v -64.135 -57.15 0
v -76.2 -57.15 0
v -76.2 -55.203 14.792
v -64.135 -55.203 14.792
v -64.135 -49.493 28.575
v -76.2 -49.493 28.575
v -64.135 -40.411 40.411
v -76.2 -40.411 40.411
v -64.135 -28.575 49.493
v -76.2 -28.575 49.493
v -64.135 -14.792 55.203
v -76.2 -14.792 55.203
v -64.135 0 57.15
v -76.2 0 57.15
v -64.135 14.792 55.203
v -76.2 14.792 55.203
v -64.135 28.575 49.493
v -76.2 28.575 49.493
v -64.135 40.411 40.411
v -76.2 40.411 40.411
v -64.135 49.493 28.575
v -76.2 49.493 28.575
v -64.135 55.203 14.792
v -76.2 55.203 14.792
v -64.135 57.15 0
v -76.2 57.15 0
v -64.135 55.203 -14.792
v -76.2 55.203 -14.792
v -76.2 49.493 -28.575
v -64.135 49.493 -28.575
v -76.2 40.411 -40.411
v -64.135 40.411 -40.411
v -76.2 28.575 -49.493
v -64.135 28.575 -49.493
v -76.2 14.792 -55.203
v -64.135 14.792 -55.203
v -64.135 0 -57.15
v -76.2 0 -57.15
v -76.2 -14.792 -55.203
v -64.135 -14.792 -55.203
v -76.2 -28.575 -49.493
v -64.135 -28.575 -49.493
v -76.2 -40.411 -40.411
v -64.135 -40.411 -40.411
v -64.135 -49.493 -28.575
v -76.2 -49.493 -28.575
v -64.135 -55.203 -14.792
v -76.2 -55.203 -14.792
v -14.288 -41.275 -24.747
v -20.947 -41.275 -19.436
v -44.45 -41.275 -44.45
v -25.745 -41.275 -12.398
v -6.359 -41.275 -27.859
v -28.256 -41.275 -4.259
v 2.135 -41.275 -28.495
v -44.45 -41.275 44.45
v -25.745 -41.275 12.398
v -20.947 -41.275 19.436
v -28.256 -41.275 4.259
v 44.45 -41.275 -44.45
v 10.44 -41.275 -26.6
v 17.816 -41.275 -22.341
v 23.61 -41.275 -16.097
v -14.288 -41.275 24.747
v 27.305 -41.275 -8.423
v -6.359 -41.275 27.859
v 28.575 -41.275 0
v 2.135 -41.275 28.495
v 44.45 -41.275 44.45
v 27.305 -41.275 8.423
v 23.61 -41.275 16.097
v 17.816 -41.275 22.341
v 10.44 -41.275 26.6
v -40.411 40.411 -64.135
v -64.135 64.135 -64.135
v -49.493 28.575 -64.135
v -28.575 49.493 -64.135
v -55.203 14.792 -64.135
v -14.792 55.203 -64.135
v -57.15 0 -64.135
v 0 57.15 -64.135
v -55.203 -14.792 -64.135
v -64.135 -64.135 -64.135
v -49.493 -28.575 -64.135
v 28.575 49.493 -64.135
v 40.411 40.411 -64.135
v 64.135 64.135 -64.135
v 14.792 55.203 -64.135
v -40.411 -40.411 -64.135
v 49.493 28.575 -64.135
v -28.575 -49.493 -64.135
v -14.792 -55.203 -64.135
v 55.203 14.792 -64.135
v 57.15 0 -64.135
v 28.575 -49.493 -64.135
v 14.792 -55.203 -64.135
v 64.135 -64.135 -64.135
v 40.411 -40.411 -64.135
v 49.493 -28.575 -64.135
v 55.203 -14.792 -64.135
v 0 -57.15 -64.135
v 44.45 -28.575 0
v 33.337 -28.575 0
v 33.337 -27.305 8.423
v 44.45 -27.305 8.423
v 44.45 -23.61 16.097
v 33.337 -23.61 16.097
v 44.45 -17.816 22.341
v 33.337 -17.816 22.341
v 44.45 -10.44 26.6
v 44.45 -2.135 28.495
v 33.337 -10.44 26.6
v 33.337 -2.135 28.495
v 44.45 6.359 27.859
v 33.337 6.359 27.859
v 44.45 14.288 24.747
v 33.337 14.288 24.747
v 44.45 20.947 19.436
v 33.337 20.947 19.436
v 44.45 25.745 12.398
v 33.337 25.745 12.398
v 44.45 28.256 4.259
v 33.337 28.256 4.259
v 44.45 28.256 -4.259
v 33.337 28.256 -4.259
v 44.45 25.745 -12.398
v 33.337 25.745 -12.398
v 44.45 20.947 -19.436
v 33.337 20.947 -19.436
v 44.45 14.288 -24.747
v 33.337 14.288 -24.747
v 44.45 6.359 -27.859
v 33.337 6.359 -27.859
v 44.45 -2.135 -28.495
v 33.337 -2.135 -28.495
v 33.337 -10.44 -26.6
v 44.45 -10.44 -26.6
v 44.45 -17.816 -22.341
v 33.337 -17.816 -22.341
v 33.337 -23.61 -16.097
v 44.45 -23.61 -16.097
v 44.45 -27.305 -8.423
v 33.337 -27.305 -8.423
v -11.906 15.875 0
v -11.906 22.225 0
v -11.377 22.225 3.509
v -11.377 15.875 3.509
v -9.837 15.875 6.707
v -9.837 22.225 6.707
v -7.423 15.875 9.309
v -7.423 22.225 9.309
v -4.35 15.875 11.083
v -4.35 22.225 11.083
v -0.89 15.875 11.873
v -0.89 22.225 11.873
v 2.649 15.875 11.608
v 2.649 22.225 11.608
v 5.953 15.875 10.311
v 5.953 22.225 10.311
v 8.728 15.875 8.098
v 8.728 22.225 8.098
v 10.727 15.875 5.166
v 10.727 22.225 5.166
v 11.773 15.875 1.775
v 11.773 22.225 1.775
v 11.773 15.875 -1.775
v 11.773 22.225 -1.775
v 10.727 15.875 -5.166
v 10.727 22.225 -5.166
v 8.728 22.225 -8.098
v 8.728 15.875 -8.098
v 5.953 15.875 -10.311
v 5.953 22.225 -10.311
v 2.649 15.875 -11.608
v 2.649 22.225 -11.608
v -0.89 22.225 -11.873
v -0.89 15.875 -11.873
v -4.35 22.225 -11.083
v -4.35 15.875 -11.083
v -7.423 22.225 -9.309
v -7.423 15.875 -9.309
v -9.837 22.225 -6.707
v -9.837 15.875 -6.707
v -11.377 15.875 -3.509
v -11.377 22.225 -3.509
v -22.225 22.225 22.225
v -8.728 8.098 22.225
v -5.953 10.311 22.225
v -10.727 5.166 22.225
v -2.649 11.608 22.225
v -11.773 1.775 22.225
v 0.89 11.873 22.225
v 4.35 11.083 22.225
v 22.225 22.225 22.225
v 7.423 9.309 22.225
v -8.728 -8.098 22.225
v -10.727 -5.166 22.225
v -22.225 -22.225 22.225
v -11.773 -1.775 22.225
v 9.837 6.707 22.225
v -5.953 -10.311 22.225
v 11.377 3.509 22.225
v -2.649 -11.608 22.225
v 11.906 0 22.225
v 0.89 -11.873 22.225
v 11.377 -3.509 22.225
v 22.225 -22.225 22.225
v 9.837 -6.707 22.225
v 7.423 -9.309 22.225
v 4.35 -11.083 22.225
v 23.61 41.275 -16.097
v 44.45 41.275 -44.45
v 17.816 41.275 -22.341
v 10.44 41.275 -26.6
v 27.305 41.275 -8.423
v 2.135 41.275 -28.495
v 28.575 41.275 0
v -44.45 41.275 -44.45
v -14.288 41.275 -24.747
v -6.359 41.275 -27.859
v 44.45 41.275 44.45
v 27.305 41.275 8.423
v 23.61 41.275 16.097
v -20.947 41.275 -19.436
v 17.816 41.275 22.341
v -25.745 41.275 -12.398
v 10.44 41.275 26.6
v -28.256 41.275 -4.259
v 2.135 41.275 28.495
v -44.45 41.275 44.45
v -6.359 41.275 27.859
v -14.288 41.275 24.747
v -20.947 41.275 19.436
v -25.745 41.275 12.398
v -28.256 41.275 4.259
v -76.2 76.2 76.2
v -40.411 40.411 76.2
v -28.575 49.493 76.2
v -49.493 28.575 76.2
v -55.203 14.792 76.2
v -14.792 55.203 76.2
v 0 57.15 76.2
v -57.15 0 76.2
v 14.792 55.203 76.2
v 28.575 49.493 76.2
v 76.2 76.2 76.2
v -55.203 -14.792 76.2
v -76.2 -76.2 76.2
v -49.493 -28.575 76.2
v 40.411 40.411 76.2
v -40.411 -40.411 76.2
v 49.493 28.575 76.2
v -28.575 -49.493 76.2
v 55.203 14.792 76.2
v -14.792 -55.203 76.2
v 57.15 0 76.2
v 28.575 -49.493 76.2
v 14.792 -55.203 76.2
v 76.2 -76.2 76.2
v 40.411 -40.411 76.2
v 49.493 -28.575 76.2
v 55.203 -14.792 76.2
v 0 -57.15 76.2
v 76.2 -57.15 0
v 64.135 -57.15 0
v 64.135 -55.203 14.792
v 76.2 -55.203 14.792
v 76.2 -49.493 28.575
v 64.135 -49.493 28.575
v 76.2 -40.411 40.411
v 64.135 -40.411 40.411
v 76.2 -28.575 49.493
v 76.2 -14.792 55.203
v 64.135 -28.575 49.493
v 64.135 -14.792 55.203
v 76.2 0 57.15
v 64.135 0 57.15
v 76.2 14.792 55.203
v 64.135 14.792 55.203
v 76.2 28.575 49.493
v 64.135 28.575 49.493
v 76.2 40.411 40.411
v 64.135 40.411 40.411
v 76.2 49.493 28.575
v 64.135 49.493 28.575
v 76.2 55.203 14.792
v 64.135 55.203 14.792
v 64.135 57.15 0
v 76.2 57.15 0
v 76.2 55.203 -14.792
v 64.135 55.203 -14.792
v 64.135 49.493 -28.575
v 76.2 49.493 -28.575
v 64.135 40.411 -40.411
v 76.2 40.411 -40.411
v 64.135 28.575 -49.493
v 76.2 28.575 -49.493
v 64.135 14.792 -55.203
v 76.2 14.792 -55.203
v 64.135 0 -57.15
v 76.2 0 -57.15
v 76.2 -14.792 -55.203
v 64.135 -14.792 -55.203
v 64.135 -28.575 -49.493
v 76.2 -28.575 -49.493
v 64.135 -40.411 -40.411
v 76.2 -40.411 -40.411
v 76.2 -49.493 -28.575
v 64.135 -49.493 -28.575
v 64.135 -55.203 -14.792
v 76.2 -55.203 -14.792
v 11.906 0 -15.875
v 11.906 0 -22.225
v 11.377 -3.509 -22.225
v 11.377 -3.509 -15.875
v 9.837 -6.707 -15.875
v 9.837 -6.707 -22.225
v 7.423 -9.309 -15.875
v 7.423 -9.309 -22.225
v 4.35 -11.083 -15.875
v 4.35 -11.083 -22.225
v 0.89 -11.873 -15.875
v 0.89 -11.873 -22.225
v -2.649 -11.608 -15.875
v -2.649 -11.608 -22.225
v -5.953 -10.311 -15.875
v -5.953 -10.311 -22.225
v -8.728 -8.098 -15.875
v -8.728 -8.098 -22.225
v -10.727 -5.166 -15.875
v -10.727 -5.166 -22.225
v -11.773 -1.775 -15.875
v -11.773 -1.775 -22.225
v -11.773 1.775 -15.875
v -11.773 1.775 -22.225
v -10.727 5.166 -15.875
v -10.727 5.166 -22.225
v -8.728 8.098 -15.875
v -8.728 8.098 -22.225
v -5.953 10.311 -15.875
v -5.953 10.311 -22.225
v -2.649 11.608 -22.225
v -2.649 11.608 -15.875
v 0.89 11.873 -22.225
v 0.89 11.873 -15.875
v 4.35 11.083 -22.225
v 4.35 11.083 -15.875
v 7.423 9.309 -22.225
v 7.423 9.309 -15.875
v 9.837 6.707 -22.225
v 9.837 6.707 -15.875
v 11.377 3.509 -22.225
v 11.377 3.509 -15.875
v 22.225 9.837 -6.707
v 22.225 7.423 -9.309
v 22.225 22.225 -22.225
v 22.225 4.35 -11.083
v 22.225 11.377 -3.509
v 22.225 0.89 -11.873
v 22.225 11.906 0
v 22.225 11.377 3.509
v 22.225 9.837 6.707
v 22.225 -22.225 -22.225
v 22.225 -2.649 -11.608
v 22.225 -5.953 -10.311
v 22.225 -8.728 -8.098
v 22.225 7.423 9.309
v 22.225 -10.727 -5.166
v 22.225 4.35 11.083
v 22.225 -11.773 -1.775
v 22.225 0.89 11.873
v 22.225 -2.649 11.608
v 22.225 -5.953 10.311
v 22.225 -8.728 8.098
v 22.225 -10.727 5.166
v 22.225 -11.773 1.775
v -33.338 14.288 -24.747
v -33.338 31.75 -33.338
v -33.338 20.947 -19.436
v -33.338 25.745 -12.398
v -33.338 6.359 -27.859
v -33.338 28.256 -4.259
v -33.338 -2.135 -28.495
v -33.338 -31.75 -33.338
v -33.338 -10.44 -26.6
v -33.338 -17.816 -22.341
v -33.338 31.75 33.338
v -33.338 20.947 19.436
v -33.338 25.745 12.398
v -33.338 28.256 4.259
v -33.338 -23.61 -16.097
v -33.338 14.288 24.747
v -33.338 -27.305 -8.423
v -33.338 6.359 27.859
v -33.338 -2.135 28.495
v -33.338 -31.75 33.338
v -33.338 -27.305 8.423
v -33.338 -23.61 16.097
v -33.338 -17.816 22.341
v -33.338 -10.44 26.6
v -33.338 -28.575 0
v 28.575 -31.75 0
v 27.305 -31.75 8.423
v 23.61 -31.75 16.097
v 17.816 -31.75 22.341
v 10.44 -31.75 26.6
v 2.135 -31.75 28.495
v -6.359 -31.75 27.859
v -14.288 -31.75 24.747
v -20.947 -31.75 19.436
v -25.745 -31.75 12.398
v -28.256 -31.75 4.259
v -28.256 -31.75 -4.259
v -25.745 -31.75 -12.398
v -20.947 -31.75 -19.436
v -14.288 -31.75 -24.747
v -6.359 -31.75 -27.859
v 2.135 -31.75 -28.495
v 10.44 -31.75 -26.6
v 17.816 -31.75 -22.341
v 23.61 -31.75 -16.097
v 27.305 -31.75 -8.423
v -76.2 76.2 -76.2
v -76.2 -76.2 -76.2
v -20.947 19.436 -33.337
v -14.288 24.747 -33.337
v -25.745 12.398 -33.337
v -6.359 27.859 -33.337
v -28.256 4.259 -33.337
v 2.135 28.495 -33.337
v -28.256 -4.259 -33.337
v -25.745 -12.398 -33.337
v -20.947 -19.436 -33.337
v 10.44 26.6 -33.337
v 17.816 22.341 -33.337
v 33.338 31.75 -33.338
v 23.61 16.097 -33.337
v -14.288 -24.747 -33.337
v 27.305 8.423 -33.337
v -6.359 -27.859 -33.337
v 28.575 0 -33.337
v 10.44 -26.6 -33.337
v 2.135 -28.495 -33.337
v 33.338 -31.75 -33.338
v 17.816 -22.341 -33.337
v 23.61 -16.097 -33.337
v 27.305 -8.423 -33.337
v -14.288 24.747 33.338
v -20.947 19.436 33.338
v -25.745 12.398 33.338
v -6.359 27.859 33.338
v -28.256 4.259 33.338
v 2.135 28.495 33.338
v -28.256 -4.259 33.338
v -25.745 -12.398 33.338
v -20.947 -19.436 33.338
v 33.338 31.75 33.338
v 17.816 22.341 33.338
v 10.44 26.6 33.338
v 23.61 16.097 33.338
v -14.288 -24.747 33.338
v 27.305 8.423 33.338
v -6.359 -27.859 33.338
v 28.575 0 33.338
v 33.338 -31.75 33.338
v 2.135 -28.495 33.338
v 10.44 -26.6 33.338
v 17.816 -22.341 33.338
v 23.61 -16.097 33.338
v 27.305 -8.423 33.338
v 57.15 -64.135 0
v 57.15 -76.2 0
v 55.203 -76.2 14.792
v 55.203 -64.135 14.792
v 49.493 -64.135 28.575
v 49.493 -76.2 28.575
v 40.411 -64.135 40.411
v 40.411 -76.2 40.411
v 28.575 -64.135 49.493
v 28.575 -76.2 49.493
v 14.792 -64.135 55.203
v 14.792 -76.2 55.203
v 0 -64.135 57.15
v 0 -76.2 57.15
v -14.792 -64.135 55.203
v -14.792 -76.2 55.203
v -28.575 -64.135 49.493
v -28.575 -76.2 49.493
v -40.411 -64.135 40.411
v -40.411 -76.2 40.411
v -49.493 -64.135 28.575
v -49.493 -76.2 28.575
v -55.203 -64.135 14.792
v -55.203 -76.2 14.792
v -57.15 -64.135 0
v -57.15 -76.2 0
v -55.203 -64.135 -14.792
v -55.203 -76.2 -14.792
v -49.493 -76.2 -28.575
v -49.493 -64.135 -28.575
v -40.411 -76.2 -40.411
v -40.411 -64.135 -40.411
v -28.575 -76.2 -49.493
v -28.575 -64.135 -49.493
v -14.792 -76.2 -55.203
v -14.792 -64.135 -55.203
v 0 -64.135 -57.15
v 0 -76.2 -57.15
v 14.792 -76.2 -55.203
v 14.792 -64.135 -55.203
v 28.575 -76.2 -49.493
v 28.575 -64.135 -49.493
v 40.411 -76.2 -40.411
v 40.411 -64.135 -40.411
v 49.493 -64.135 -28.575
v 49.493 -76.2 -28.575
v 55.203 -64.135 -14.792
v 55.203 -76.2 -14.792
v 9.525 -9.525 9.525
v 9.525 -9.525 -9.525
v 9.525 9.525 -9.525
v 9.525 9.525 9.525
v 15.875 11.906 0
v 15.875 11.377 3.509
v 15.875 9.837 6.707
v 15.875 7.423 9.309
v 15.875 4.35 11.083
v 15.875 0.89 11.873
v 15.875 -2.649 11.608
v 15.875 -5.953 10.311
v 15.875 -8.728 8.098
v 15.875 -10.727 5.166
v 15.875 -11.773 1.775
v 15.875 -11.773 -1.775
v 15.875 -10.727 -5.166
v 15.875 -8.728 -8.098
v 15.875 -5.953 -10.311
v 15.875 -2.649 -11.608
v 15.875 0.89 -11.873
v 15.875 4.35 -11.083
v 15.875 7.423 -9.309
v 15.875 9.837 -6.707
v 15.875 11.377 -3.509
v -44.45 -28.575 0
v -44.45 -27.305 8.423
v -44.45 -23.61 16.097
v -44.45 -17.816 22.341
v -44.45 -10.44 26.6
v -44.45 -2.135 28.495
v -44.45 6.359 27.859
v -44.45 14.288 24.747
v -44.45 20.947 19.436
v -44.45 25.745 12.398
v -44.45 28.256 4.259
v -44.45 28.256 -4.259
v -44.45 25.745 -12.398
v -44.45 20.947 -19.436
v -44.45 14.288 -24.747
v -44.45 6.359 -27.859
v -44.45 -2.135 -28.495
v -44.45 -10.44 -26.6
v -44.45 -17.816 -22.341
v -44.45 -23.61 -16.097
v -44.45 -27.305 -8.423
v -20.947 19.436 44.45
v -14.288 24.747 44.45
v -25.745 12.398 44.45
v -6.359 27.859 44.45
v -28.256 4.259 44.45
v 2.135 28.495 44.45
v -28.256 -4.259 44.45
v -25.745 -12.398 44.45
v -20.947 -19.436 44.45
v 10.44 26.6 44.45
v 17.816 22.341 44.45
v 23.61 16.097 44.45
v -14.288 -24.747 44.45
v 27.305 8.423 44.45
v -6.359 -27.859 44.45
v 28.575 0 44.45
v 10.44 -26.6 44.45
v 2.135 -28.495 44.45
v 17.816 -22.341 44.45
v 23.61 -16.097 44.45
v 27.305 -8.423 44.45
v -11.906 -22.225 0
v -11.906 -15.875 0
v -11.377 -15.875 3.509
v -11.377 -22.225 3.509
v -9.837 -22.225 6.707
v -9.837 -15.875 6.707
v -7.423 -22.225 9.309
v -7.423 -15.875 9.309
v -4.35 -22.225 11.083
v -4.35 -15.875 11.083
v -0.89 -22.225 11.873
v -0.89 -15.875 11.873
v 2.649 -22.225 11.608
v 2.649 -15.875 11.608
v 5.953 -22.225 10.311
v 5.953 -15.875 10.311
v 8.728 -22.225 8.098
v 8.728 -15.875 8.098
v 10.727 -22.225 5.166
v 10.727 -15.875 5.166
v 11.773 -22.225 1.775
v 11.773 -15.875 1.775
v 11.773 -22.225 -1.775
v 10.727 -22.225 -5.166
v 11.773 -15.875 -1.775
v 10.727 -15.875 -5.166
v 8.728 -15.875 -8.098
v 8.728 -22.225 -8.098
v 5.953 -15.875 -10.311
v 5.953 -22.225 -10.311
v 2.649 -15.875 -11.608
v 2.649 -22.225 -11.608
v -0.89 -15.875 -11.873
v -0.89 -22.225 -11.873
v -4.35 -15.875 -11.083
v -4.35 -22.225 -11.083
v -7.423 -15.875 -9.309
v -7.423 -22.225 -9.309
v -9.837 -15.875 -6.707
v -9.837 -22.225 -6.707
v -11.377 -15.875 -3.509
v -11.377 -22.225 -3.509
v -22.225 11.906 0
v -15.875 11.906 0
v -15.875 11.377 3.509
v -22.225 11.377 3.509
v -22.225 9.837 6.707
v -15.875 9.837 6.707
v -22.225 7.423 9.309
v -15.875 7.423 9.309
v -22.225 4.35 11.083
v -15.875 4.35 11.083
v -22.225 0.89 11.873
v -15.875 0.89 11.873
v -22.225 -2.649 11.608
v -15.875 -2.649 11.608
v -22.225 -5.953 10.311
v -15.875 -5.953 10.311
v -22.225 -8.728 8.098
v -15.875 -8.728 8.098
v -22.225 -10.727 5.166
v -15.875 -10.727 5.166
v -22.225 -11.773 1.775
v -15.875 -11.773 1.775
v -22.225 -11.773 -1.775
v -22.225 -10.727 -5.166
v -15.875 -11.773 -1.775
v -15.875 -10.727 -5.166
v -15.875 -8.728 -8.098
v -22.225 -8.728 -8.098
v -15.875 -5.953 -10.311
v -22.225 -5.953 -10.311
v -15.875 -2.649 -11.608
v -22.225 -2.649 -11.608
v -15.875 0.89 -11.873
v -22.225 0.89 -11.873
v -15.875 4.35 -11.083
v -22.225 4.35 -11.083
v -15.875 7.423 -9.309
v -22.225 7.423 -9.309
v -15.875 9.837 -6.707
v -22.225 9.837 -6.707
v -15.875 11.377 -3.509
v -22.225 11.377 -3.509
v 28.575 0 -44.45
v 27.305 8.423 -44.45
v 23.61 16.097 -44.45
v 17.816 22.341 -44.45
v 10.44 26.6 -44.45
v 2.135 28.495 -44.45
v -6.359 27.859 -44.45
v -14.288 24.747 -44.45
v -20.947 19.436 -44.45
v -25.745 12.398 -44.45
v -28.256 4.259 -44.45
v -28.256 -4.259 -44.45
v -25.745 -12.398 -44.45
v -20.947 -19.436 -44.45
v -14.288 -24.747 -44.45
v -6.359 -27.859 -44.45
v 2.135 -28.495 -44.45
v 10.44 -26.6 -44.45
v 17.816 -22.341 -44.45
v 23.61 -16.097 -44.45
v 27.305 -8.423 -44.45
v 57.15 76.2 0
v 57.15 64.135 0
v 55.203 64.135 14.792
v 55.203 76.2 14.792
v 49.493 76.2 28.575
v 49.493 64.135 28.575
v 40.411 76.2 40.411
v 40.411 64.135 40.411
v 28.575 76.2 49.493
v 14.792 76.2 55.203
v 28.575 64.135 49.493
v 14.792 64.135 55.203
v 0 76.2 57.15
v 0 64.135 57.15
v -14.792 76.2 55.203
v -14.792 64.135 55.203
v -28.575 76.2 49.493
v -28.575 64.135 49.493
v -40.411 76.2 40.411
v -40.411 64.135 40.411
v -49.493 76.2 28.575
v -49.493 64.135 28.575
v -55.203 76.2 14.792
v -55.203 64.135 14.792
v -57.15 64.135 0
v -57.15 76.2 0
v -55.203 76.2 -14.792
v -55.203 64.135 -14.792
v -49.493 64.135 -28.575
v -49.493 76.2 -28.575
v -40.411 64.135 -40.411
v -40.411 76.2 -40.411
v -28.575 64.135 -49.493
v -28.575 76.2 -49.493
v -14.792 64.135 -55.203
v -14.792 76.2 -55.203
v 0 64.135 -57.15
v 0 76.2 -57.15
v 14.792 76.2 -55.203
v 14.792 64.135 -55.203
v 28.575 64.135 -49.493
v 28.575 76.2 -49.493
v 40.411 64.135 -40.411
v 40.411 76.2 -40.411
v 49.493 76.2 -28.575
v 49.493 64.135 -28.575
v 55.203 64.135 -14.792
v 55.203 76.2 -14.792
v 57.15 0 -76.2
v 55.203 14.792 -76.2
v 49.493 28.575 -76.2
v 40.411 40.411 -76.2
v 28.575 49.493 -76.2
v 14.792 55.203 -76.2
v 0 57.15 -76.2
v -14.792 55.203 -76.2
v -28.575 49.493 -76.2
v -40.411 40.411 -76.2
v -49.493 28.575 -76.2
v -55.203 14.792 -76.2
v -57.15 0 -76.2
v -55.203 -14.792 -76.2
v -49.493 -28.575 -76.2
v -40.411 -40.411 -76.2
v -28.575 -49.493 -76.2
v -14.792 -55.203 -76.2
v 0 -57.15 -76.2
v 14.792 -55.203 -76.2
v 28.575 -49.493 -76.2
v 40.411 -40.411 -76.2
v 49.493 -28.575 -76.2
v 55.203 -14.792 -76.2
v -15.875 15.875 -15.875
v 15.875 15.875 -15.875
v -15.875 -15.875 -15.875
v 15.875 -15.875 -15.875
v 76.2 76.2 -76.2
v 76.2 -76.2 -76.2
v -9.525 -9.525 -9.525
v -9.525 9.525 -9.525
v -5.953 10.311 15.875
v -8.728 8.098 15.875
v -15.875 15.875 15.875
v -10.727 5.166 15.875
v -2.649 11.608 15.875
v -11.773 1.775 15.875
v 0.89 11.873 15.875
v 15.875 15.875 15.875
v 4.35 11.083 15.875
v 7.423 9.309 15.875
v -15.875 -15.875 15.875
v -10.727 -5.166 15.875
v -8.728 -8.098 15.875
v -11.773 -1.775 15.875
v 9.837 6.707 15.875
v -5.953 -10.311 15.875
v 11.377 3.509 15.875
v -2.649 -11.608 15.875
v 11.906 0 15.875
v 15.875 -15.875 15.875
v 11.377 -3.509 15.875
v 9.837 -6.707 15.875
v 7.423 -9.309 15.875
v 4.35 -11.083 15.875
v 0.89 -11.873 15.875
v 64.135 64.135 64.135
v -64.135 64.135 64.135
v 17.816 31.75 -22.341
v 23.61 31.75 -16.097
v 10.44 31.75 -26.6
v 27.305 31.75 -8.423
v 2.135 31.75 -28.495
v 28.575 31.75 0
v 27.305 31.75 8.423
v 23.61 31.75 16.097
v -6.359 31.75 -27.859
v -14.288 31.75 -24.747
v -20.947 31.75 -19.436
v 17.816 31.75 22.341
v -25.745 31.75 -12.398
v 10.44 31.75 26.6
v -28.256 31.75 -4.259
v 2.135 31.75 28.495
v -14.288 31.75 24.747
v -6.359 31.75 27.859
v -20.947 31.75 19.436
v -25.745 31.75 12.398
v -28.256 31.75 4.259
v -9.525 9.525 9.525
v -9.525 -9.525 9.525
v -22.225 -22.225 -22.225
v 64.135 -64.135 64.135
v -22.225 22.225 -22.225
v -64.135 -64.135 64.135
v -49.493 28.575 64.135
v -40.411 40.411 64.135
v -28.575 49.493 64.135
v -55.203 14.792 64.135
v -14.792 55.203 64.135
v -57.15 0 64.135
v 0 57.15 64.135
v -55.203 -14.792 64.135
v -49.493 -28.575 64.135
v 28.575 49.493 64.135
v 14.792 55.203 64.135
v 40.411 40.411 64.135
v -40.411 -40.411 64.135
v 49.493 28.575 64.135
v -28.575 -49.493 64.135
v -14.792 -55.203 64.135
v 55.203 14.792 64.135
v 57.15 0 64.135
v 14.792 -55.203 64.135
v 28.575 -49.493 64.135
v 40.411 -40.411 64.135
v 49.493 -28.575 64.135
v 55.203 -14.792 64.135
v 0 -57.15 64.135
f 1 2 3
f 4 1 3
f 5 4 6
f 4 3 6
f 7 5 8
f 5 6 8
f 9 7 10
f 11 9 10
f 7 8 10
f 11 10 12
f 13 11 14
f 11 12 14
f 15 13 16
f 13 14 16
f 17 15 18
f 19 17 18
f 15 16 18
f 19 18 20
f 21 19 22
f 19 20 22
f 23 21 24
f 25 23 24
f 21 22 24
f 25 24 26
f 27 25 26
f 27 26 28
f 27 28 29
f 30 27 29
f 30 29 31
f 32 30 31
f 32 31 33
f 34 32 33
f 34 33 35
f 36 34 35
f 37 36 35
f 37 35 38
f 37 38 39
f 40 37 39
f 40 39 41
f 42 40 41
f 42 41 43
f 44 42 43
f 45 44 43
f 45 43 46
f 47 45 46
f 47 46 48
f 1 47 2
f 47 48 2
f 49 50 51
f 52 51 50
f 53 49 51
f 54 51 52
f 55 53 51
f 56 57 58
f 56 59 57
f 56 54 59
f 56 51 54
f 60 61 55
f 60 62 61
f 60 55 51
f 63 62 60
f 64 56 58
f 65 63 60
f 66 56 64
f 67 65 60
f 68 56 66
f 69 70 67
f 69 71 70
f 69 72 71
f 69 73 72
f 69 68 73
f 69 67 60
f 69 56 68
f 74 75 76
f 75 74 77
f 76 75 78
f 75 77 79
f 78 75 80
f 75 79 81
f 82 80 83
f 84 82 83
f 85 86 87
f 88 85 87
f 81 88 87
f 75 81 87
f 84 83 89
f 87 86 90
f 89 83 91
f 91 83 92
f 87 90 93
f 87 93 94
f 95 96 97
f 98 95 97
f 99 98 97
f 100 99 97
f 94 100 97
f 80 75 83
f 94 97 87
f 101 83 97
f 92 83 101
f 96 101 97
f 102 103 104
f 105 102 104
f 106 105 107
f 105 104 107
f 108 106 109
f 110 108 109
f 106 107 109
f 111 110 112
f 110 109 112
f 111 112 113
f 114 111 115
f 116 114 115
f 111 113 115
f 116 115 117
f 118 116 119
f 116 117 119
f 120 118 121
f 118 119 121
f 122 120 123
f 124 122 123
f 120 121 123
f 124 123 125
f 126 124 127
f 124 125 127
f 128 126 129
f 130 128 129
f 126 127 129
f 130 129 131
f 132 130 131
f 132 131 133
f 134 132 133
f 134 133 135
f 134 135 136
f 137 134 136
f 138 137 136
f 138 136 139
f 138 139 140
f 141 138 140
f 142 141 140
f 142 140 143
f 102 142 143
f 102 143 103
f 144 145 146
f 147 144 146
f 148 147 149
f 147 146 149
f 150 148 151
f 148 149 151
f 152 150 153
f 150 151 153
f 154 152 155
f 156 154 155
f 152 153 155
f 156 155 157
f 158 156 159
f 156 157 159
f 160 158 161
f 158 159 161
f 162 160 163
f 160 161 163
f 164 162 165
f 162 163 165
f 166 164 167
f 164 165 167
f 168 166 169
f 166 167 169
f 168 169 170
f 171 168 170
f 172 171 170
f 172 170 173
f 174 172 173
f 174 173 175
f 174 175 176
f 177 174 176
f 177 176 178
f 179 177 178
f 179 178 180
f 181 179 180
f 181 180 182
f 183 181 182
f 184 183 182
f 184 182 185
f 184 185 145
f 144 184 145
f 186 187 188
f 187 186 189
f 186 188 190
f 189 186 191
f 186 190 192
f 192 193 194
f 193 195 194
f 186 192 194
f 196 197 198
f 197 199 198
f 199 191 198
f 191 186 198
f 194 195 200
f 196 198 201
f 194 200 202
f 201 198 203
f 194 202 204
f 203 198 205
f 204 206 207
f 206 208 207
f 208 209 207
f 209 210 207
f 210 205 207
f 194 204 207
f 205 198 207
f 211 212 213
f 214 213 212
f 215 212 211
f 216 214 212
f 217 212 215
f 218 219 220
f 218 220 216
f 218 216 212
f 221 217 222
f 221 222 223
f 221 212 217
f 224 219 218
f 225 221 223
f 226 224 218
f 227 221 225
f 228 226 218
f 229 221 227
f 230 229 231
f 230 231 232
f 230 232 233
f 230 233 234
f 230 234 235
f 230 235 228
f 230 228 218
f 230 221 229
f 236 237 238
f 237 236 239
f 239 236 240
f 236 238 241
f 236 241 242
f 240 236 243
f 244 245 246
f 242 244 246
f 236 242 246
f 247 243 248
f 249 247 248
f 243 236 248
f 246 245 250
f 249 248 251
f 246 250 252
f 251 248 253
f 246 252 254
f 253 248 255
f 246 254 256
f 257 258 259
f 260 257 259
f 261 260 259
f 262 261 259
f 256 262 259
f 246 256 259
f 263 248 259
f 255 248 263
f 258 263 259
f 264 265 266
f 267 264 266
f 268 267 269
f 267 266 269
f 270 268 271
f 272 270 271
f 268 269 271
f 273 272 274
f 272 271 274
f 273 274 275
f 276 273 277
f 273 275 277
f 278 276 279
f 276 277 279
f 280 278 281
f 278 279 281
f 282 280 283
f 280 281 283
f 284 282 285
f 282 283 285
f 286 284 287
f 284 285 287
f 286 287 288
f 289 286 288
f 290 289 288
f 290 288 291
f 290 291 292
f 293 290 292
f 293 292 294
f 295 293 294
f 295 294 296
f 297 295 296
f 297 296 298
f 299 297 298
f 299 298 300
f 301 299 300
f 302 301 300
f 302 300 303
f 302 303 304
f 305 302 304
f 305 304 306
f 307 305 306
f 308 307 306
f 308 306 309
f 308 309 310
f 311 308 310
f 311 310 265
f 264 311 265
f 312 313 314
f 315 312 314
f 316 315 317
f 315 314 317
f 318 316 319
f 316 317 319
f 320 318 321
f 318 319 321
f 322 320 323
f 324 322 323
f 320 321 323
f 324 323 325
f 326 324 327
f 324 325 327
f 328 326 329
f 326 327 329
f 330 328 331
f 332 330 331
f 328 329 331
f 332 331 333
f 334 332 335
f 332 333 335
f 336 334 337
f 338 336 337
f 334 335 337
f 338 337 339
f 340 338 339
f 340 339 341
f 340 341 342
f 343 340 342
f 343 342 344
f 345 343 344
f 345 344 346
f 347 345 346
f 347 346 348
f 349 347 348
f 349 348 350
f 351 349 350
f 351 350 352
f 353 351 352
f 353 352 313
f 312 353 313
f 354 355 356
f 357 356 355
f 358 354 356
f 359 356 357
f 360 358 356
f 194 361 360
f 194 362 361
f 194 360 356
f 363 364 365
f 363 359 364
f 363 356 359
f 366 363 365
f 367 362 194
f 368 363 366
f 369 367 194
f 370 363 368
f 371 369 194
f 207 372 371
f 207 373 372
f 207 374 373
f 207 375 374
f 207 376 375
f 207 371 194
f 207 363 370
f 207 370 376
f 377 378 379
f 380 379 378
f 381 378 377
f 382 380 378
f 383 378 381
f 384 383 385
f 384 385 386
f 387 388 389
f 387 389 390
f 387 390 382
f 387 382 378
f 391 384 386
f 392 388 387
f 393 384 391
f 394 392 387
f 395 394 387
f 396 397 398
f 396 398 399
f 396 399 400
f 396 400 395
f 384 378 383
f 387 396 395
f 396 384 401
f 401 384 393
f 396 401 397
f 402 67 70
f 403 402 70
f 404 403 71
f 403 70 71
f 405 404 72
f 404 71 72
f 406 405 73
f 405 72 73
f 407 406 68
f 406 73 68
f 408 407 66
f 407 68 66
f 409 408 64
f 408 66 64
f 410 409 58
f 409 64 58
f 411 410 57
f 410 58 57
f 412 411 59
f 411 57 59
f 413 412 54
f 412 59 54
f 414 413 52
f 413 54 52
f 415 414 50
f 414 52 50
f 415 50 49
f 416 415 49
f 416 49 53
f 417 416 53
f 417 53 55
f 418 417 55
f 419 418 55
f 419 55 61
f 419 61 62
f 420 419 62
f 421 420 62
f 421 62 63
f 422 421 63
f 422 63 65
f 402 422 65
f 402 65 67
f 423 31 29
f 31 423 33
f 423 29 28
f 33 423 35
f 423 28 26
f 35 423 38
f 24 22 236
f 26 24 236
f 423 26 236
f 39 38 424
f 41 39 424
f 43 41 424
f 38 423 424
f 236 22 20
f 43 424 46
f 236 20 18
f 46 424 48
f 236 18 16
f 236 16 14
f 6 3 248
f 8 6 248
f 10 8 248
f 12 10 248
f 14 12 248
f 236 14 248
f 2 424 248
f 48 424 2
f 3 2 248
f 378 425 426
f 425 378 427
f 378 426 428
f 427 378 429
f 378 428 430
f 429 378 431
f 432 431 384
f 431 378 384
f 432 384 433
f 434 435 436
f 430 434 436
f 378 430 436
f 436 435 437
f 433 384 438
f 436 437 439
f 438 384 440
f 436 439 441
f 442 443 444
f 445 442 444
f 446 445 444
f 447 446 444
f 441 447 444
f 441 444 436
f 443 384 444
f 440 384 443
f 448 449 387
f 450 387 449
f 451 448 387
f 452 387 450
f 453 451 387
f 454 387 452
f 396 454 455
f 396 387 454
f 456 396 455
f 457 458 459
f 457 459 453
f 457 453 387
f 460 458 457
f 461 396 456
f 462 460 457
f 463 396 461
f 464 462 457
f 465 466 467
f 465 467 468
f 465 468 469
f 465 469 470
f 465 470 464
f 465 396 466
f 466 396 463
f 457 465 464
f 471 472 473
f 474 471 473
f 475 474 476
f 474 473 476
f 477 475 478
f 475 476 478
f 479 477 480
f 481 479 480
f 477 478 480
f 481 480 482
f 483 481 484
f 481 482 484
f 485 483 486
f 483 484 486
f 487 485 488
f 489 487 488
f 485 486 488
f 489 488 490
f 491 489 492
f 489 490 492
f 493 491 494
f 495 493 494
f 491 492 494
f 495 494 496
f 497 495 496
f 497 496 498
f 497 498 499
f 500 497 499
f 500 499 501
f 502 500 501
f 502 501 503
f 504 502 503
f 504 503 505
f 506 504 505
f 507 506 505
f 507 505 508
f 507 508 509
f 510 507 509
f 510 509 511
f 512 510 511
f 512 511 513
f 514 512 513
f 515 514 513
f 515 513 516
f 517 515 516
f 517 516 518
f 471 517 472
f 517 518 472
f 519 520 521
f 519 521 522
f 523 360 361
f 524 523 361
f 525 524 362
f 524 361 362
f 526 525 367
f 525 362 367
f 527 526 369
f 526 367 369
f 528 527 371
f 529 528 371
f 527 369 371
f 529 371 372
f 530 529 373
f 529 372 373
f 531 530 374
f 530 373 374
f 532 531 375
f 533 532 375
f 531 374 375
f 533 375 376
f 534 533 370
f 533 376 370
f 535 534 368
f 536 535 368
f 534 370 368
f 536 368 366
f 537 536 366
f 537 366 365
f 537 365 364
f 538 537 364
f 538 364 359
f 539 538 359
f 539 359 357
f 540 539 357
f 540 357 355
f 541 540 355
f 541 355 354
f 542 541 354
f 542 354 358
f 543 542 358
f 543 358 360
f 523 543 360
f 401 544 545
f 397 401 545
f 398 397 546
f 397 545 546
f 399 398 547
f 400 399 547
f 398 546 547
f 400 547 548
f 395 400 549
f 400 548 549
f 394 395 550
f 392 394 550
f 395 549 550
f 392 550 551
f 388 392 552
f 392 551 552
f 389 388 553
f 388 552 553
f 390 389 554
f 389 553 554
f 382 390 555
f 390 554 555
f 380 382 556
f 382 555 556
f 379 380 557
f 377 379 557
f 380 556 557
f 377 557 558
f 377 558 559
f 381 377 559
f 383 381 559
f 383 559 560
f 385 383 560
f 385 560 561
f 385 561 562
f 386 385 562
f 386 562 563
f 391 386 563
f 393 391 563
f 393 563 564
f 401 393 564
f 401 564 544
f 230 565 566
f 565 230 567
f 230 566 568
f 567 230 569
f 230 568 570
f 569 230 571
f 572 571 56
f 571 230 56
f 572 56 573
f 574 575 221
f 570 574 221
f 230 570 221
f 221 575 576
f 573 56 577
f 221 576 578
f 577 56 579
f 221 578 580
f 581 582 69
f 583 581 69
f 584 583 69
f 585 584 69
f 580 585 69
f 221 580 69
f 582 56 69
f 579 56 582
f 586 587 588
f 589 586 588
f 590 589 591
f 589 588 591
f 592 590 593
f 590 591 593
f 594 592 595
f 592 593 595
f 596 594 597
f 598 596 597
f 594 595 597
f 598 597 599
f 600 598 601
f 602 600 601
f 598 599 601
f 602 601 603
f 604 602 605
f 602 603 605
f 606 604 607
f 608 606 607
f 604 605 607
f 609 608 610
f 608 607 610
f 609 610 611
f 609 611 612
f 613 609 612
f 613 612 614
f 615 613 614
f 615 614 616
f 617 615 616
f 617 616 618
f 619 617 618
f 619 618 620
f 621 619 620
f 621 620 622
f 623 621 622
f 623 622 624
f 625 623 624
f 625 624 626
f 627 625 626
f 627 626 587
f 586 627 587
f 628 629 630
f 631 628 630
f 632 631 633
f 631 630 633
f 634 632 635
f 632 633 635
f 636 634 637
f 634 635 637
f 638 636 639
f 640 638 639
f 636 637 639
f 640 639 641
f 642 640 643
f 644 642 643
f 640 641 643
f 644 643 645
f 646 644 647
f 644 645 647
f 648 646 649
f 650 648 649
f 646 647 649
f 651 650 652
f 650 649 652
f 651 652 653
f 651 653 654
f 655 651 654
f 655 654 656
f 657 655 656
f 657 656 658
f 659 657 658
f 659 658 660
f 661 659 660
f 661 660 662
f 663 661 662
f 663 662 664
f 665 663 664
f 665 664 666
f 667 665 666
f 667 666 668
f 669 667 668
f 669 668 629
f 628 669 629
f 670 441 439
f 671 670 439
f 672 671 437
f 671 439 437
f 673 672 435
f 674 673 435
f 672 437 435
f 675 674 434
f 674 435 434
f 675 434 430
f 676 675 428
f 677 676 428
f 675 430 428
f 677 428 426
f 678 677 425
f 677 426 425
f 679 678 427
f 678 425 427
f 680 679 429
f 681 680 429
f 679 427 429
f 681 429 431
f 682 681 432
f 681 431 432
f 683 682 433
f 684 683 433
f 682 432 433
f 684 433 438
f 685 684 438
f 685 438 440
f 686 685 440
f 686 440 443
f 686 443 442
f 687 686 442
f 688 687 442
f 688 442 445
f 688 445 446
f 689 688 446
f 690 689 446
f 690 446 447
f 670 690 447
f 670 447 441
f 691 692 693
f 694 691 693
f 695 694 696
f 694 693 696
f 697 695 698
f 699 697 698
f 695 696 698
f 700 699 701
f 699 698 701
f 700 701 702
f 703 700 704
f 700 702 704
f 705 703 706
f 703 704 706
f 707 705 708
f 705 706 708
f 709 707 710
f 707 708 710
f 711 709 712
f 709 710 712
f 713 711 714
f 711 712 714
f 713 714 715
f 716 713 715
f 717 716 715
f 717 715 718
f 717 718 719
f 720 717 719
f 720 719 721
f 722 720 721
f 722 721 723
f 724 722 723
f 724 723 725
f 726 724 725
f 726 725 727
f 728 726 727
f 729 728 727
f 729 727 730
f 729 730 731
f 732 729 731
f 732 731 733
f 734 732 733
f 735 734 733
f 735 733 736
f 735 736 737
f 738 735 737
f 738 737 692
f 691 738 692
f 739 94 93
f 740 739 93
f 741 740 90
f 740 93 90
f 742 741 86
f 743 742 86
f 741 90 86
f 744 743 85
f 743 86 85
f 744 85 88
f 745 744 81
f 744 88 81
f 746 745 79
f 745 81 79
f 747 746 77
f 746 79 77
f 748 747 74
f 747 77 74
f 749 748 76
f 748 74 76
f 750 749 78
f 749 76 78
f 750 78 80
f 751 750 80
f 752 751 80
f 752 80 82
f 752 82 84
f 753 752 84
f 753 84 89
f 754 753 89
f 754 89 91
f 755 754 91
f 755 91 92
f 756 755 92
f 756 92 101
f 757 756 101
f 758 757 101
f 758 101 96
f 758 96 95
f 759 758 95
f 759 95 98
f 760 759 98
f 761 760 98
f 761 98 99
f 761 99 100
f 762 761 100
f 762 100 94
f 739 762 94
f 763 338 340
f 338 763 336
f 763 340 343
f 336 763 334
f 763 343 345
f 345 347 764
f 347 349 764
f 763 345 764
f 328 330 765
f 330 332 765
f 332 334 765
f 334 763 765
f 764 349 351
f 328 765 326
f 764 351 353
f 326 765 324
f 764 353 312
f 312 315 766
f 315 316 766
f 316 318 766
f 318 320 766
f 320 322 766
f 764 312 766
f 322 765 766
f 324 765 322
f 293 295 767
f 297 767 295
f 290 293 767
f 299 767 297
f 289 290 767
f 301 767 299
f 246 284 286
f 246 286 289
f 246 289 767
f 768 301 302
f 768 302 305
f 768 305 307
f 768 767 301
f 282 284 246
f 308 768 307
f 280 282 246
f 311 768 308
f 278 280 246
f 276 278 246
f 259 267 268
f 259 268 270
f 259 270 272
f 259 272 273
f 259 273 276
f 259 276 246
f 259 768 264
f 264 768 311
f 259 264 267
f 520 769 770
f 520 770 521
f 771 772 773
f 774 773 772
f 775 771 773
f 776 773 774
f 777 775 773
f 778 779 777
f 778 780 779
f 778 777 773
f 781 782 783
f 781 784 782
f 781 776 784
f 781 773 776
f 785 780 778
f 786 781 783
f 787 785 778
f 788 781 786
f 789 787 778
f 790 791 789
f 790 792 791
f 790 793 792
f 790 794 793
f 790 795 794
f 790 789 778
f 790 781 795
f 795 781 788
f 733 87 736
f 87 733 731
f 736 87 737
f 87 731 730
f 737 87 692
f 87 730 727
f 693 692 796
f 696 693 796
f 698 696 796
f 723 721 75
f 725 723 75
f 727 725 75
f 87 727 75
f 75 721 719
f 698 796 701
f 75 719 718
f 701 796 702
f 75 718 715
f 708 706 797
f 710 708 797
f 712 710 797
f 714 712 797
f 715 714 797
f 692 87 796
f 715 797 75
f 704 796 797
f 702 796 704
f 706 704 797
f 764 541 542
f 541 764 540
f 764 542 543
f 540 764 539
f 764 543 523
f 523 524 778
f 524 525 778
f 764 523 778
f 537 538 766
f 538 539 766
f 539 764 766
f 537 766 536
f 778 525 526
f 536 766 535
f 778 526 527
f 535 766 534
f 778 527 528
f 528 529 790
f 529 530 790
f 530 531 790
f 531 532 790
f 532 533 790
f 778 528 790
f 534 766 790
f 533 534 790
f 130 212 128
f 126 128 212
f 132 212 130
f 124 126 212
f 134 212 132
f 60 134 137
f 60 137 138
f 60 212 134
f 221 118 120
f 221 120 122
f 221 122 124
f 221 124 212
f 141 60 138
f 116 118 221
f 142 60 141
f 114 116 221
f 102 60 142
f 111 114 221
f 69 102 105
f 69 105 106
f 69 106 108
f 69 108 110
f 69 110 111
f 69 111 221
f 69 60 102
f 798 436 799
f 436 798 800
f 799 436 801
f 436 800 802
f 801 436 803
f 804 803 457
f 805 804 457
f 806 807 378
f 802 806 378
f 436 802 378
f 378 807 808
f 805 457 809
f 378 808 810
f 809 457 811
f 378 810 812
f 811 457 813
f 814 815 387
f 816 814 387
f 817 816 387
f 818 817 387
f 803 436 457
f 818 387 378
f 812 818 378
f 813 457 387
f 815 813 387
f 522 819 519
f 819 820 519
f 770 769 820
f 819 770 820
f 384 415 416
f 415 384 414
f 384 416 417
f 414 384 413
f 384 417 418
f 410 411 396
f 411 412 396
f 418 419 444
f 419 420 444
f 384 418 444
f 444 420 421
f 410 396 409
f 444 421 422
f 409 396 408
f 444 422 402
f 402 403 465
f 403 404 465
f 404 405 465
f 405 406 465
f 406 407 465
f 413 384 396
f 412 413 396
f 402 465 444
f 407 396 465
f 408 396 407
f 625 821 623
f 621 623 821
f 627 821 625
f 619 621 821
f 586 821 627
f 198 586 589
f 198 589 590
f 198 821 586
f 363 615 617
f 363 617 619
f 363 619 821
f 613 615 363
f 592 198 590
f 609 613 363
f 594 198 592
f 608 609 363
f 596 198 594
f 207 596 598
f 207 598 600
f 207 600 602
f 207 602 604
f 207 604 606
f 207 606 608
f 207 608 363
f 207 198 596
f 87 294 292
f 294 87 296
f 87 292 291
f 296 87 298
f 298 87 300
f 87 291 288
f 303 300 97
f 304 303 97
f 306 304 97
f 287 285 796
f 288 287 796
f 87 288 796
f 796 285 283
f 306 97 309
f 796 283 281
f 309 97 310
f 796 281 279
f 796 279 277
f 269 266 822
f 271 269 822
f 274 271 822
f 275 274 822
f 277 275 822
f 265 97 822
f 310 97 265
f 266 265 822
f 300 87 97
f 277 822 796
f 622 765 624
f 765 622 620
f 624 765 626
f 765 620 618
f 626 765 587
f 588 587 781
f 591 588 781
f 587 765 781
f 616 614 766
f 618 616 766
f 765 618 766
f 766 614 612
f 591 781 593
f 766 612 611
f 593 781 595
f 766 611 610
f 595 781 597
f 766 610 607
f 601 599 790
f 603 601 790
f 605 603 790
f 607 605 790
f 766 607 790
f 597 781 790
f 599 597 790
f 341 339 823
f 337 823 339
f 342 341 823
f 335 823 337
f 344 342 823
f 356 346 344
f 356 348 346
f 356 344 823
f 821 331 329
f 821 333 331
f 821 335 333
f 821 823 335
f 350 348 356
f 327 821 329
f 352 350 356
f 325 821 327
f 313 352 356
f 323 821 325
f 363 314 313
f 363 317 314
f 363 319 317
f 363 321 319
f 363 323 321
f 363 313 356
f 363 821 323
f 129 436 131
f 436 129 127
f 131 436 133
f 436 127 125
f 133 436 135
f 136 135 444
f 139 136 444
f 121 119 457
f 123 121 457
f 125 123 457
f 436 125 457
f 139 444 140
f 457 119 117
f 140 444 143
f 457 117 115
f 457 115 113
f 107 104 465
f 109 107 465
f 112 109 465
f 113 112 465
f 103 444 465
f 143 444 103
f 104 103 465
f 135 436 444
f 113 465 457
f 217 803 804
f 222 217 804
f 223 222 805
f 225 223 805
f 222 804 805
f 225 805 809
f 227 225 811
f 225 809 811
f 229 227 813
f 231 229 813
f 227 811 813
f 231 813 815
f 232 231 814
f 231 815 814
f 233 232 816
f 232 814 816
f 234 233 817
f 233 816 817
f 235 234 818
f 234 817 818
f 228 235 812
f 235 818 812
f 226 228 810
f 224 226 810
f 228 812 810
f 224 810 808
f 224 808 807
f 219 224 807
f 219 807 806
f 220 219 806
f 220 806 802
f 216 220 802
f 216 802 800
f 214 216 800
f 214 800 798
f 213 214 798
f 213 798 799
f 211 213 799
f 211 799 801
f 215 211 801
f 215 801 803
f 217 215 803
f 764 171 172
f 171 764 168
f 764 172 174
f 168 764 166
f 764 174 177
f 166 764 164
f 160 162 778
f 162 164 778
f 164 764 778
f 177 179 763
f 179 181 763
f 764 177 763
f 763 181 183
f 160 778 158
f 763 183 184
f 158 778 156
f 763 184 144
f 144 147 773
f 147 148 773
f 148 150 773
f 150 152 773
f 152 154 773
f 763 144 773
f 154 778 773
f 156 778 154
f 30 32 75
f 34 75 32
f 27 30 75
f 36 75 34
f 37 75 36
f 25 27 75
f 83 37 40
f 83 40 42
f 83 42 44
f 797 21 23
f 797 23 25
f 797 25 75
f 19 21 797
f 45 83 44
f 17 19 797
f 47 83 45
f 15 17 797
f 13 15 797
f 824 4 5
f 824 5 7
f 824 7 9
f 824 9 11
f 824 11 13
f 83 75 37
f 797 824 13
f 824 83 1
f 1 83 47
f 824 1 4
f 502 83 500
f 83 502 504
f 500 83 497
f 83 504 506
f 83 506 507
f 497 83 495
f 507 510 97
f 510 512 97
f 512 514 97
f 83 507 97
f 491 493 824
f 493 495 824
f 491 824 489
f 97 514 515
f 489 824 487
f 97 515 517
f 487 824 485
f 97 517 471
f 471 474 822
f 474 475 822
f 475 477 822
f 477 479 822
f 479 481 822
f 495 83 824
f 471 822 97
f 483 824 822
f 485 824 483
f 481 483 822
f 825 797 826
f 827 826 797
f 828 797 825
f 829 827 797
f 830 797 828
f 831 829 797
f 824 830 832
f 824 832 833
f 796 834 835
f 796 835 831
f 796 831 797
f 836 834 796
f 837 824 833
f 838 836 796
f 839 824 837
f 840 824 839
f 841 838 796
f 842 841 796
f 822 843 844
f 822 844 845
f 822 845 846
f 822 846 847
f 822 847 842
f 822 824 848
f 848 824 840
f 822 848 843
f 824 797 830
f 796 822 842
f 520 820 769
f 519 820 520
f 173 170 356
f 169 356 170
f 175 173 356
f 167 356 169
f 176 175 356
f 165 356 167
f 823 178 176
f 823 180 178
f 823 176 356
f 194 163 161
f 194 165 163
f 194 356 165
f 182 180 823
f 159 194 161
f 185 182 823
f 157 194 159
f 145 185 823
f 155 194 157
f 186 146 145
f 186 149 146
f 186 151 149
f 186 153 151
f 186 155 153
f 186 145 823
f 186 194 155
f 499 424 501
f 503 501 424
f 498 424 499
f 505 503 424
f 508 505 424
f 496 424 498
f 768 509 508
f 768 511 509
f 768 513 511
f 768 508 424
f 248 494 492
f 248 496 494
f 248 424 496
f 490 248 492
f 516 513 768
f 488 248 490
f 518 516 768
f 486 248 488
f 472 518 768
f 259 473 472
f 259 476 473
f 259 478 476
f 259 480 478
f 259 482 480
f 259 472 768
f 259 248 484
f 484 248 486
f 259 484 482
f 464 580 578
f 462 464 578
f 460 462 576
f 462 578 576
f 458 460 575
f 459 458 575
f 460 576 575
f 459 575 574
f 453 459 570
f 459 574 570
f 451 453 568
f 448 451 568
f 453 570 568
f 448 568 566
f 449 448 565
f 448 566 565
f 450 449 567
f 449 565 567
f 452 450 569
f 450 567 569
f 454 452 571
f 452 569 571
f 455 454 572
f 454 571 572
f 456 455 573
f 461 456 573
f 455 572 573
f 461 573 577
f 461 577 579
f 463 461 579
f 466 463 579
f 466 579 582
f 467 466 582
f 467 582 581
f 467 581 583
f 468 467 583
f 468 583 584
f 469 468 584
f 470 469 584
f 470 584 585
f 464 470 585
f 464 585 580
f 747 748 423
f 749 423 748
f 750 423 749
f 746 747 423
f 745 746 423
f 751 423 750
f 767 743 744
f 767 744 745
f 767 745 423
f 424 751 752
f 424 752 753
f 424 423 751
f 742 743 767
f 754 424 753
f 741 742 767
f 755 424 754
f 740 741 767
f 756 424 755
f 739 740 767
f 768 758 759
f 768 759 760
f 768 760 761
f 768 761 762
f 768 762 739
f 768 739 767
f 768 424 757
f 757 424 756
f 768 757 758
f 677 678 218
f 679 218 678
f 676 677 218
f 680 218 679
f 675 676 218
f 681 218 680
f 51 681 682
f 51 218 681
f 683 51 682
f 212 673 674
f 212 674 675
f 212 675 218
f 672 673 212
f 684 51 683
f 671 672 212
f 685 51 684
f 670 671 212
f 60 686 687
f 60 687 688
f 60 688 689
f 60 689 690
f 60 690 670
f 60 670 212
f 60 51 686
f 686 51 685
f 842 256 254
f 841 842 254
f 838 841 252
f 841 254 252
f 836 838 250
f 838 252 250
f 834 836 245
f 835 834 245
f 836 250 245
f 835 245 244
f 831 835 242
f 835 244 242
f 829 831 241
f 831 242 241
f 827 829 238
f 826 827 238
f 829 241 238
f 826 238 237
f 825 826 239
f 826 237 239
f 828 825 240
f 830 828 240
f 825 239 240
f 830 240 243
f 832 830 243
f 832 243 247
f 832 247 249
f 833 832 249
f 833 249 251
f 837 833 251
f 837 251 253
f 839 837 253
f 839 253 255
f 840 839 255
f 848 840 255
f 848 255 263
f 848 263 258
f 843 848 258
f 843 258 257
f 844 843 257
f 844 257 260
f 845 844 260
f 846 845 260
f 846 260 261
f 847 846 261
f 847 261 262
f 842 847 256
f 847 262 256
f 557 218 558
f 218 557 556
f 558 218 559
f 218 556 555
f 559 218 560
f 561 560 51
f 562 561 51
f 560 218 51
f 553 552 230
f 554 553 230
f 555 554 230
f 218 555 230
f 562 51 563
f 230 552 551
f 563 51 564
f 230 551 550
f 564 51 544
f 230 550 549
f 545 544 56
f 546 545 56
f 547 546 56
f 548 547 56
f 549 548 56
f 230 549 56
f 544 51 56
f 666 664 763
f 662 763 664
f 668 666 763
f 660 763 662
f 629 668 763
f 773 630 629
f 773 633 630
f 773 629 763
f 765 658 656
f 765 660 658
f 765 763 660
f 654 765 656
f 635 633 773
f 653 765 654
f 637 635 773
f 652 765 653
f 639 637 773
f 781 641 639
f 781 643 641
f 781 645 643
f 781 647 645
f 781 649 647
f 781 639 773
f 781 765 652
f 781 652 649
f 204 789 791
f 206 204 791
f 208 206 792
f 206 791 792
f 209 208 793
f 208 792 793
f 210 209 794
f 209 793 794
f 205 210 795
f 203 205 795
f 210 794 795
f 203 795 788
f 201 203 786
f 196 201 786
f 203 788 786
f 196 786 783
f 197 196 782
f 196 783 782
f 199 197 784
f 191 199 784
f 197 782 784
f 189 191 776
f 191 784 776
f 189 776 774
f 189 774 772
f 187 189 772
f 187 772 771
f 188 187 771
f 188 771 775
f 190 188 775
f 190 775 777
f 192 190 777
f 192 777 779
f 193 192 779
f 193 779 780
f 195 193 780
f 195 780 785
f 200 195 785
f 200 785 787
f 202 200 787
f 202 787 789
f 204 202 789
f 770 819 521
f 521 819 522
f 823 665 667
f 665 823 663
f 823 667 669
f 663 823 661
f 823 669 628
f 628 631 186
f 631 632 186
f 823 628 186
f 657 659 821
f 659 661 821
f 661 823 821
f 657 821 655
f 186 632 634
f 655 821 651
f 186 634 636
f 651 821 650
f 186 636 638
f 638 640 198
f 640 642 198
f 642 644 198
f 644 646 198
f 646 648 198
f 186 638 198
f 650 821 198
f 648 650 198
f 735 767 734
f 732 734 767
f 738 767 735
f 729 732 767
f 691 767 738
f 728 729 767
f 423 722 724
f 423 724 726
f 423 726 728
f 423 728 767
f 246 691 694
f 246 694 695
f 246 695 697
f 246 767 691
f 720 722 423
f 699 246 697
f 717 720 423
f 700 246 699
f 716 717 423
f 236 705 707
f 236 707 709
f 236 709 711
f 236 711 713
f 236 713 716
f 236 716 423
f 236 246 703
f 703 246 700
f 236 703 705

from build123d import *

# Parameters (mm, degrees)
F0_W      = 19.05
F0_H      = 19.05
F1_DEPTH  = 9.525
F2_W      = 44.45
F2_H      = 44.45
F2_W_2    = 31.75
F2_H_2    = 31.75
F3_DEPTH  = 22.225
F4_W      = 31.75
F4_H      = 31.75
F5_DEPTH  = 6.35
F6_W      = 31.75
F6_H      = 31.75
F7_DEPTH  = 6.35
F8_R      = 11.90625
F9_DEPTH  = 44.451
F10_R     = 11.90625
F11_DEPTH = 44.451
F12_R     = 11.90625
F13_DEPTH = 44.451
F14_W     = 88.9
F14_H     = 88.9
F14_W_2   = 66.675
F14_H_2   = 66.675
F15_DEPTH = 41.275
F16_W     = 66.675
F16_H     = 66.675
F17_DEPTH = 9.525
F18_W     = 66.675
F18_H     = 66.675
F19_DEPTH = 9.525
F20_R     = 28.575
F21_DEPTH = 82.551
F22_R     = 28.575
F23_DEPTH = 88.901
F24_R     = 28.575
F25_DEPTH = 88.901
F26_W     = 152.4
F26_H     = 152.4
F26_W_2   = 128.27
F26_H_2   = 128.27
F27_DEPTH = 76.2
F28_W     = 128.27
F28_H     = 128.27
F29_DEPTH = 12.065
F30_W     = 128.27
F30_H     = 128.27
F31_DEPTH = 12.065
F32_R     = 57.15
F33_DEPTH = 152.401
F34_R     = 57.15
F35_DEPTH = 152.401
F36_R     = 57.15
F37_DEPTH = 152.401


with BuildPart() as f1:
    # F0 (on Front) → F1 (new body, symmetric)
    with BuildSketch(Plane.XZ):
        Rectangle(F0_W, F0_H)
    extrude(amount=F1_DEPTH, both=True)


with BuildPart() as f3:
    # F2 (on Front) → F3 (new body, symmetric)
    with BuildSketch(Plane.XZ):
        Rectangle(F2_W, F2_H)
        Rectangle(F2_W_2, F2_H_2, mode=Mode.SUBTRACT)
    extrude(amount=F3_DEPTH, both=True)

    # F4 (on face) → F5 (join)
    with BuildSketch(Plane.XZ.offset(22.225)):
        Rectangle(F4_W, F4_H)
    extrude(amount=-F5_DEPTH)

    # F6 (on face) → F7 (join)
    with BuildSketch(Plane(origin=(0, 22.225, 0), x_dir=(-1, 0, 0), z_dir=(0, 1, 0))):
        Rectangle(F6_W, F6_H)
    extrude(amount=-F7_DEPTH)

    # F8 (on face) → F9 (cut, through all)
    with BuildSketch(Plane(origin=(0, 22.225, 0), x_dir=(-1, 0, 0), z_dir=(0, 1, 0))):
        Circle(F8_R)
    extrude(amount=-F9_DEPTH, mode=Mode.SUBTRACT)

    # F10 (on face) → F11 (cut, through all)
    with BuildSketch(Plane.YZ.offset(22.225)):
        Circle(F10_R)
    extrude(amount=-F11_DEPTH, mode=Mode.SUBTRACT)

    # F12 (on face) → F13 (cut, through all)
    with BuildSketch(Plane(origin=(0, 0, -22.225), x_dir=(1, 0, 0), z_dir=(0, 0, -1))):
        Circle(F12_R)
    extrude(amount=-F13_DEPTH, mode=Mode.SUBTRACT)


with BuildPart() as f15:
    # F14 (on Front) → F15 (new body, symmetric)
    with BuildSketch(Plane.XZ):
        Rectangle(F14_W, F14_H)
        Rectangle(F14_W_2, F14_H_2, mode=Mode.SUBTRACT)
    extrude(amount=F15_DEPTH, both=True)

    # F16 (on face) → F17 (join)
    with BuildSketch(Plane(origin=(0, 41.275, 0), x_dir=(-1, 0, 0), z_dir=(0, 1, 0))):
        Rectangle(F16_W, F16_H)
    extrude(amount=-F17_DEPTH)

    # F18 (on face) → F19 (join)
    with BuildSketch(Plane.XZ.offset(41.275)):
        Rectangle(F18_W, F18_H)
    extrude(amount=-F19_DEPTH)

    # F20 (on face) → F21 (cut, through all)
    with BuildSketch(Plane.XZ.offset(41.275)):
        Circle(F20_R)
    extrude(amount=-F21_DEPTH, mode=Mode.SUBTRACT)

    # F22 (on face) → F23 (cut, through all)
    with BuildSketch(Plane(origin=(-44.45, 0, 0), x_dir=(0, -1, 0), z_dir=(-1, 0, 0))):
        Circle(F22_R)
    extrude(amount=-F23_DEPTH, mode=Mode.SUBTRACT)

    # F24 (on face) → F25 (cut, through all)
    with BuildSketch(Plane.XY.offset(44.45)):
        Circle(F24_R)
    extrude(amount=-F25_DEPTH, mode=Mode.SUBTRACT)


with BuildPart() as f27:
    # F26 (on Front) → F27 (new body, symmetric)
    with BuildSketch(Plane.XZ):
        Rectangle(F26_W, F26_H)
        Rectangle(F26_W_2, F26_H_2, mode=Mode.SUBTRACT)
    extrude(amount=F27_DEPTH, both=True)

    # F28 (on face) → F29 (join)
    with BuildSketch(Plane.XZ.offset(76.2)):
        Rectangle(F28_W, F28_H)
    extrude(amount=-F29_DEPTH)

    # F30 (on face) → F31 (join)
    with BuildSketch(Plane(origin=(0, 76.2, 0), x_dir=(-1, 0, 0), z_dir=(0, 1, 0))):
        Rectangle(F30_W, F30_H)
    extrude(amount=-F31_DEPTH)

    # F32 (on face) → F33 (cut, through all)
    with BuildSketch(Plane.XZ.offset(76.2)):
        Circle(F32_R)
    extrude(amount=-F33_DEPTH, mode=Mode.SUBTRACT)

    # F34 (on face) → F35 (cut, through all)
    with BuildSketch(Plane(origin=(-76.2, 0, 0), x_dir=(0, -1, 0), z_dir=(-1, 0, 0))):
        Circle(F34_R)
    extrude(amount=-F35_DEPTH, mode=Mode.SUBTRACT)

    # F36 (on face) → F37 (cut, through all)
    with BuildSketch(Plane.XY.offset(76.2)):
        Circle(F36_R)
    extrude(amount=-F37_DEPTH, mode=Mode.SUBTRACT)


solid = Compound([f1.part, f3.part, f15.part, f27.part])
